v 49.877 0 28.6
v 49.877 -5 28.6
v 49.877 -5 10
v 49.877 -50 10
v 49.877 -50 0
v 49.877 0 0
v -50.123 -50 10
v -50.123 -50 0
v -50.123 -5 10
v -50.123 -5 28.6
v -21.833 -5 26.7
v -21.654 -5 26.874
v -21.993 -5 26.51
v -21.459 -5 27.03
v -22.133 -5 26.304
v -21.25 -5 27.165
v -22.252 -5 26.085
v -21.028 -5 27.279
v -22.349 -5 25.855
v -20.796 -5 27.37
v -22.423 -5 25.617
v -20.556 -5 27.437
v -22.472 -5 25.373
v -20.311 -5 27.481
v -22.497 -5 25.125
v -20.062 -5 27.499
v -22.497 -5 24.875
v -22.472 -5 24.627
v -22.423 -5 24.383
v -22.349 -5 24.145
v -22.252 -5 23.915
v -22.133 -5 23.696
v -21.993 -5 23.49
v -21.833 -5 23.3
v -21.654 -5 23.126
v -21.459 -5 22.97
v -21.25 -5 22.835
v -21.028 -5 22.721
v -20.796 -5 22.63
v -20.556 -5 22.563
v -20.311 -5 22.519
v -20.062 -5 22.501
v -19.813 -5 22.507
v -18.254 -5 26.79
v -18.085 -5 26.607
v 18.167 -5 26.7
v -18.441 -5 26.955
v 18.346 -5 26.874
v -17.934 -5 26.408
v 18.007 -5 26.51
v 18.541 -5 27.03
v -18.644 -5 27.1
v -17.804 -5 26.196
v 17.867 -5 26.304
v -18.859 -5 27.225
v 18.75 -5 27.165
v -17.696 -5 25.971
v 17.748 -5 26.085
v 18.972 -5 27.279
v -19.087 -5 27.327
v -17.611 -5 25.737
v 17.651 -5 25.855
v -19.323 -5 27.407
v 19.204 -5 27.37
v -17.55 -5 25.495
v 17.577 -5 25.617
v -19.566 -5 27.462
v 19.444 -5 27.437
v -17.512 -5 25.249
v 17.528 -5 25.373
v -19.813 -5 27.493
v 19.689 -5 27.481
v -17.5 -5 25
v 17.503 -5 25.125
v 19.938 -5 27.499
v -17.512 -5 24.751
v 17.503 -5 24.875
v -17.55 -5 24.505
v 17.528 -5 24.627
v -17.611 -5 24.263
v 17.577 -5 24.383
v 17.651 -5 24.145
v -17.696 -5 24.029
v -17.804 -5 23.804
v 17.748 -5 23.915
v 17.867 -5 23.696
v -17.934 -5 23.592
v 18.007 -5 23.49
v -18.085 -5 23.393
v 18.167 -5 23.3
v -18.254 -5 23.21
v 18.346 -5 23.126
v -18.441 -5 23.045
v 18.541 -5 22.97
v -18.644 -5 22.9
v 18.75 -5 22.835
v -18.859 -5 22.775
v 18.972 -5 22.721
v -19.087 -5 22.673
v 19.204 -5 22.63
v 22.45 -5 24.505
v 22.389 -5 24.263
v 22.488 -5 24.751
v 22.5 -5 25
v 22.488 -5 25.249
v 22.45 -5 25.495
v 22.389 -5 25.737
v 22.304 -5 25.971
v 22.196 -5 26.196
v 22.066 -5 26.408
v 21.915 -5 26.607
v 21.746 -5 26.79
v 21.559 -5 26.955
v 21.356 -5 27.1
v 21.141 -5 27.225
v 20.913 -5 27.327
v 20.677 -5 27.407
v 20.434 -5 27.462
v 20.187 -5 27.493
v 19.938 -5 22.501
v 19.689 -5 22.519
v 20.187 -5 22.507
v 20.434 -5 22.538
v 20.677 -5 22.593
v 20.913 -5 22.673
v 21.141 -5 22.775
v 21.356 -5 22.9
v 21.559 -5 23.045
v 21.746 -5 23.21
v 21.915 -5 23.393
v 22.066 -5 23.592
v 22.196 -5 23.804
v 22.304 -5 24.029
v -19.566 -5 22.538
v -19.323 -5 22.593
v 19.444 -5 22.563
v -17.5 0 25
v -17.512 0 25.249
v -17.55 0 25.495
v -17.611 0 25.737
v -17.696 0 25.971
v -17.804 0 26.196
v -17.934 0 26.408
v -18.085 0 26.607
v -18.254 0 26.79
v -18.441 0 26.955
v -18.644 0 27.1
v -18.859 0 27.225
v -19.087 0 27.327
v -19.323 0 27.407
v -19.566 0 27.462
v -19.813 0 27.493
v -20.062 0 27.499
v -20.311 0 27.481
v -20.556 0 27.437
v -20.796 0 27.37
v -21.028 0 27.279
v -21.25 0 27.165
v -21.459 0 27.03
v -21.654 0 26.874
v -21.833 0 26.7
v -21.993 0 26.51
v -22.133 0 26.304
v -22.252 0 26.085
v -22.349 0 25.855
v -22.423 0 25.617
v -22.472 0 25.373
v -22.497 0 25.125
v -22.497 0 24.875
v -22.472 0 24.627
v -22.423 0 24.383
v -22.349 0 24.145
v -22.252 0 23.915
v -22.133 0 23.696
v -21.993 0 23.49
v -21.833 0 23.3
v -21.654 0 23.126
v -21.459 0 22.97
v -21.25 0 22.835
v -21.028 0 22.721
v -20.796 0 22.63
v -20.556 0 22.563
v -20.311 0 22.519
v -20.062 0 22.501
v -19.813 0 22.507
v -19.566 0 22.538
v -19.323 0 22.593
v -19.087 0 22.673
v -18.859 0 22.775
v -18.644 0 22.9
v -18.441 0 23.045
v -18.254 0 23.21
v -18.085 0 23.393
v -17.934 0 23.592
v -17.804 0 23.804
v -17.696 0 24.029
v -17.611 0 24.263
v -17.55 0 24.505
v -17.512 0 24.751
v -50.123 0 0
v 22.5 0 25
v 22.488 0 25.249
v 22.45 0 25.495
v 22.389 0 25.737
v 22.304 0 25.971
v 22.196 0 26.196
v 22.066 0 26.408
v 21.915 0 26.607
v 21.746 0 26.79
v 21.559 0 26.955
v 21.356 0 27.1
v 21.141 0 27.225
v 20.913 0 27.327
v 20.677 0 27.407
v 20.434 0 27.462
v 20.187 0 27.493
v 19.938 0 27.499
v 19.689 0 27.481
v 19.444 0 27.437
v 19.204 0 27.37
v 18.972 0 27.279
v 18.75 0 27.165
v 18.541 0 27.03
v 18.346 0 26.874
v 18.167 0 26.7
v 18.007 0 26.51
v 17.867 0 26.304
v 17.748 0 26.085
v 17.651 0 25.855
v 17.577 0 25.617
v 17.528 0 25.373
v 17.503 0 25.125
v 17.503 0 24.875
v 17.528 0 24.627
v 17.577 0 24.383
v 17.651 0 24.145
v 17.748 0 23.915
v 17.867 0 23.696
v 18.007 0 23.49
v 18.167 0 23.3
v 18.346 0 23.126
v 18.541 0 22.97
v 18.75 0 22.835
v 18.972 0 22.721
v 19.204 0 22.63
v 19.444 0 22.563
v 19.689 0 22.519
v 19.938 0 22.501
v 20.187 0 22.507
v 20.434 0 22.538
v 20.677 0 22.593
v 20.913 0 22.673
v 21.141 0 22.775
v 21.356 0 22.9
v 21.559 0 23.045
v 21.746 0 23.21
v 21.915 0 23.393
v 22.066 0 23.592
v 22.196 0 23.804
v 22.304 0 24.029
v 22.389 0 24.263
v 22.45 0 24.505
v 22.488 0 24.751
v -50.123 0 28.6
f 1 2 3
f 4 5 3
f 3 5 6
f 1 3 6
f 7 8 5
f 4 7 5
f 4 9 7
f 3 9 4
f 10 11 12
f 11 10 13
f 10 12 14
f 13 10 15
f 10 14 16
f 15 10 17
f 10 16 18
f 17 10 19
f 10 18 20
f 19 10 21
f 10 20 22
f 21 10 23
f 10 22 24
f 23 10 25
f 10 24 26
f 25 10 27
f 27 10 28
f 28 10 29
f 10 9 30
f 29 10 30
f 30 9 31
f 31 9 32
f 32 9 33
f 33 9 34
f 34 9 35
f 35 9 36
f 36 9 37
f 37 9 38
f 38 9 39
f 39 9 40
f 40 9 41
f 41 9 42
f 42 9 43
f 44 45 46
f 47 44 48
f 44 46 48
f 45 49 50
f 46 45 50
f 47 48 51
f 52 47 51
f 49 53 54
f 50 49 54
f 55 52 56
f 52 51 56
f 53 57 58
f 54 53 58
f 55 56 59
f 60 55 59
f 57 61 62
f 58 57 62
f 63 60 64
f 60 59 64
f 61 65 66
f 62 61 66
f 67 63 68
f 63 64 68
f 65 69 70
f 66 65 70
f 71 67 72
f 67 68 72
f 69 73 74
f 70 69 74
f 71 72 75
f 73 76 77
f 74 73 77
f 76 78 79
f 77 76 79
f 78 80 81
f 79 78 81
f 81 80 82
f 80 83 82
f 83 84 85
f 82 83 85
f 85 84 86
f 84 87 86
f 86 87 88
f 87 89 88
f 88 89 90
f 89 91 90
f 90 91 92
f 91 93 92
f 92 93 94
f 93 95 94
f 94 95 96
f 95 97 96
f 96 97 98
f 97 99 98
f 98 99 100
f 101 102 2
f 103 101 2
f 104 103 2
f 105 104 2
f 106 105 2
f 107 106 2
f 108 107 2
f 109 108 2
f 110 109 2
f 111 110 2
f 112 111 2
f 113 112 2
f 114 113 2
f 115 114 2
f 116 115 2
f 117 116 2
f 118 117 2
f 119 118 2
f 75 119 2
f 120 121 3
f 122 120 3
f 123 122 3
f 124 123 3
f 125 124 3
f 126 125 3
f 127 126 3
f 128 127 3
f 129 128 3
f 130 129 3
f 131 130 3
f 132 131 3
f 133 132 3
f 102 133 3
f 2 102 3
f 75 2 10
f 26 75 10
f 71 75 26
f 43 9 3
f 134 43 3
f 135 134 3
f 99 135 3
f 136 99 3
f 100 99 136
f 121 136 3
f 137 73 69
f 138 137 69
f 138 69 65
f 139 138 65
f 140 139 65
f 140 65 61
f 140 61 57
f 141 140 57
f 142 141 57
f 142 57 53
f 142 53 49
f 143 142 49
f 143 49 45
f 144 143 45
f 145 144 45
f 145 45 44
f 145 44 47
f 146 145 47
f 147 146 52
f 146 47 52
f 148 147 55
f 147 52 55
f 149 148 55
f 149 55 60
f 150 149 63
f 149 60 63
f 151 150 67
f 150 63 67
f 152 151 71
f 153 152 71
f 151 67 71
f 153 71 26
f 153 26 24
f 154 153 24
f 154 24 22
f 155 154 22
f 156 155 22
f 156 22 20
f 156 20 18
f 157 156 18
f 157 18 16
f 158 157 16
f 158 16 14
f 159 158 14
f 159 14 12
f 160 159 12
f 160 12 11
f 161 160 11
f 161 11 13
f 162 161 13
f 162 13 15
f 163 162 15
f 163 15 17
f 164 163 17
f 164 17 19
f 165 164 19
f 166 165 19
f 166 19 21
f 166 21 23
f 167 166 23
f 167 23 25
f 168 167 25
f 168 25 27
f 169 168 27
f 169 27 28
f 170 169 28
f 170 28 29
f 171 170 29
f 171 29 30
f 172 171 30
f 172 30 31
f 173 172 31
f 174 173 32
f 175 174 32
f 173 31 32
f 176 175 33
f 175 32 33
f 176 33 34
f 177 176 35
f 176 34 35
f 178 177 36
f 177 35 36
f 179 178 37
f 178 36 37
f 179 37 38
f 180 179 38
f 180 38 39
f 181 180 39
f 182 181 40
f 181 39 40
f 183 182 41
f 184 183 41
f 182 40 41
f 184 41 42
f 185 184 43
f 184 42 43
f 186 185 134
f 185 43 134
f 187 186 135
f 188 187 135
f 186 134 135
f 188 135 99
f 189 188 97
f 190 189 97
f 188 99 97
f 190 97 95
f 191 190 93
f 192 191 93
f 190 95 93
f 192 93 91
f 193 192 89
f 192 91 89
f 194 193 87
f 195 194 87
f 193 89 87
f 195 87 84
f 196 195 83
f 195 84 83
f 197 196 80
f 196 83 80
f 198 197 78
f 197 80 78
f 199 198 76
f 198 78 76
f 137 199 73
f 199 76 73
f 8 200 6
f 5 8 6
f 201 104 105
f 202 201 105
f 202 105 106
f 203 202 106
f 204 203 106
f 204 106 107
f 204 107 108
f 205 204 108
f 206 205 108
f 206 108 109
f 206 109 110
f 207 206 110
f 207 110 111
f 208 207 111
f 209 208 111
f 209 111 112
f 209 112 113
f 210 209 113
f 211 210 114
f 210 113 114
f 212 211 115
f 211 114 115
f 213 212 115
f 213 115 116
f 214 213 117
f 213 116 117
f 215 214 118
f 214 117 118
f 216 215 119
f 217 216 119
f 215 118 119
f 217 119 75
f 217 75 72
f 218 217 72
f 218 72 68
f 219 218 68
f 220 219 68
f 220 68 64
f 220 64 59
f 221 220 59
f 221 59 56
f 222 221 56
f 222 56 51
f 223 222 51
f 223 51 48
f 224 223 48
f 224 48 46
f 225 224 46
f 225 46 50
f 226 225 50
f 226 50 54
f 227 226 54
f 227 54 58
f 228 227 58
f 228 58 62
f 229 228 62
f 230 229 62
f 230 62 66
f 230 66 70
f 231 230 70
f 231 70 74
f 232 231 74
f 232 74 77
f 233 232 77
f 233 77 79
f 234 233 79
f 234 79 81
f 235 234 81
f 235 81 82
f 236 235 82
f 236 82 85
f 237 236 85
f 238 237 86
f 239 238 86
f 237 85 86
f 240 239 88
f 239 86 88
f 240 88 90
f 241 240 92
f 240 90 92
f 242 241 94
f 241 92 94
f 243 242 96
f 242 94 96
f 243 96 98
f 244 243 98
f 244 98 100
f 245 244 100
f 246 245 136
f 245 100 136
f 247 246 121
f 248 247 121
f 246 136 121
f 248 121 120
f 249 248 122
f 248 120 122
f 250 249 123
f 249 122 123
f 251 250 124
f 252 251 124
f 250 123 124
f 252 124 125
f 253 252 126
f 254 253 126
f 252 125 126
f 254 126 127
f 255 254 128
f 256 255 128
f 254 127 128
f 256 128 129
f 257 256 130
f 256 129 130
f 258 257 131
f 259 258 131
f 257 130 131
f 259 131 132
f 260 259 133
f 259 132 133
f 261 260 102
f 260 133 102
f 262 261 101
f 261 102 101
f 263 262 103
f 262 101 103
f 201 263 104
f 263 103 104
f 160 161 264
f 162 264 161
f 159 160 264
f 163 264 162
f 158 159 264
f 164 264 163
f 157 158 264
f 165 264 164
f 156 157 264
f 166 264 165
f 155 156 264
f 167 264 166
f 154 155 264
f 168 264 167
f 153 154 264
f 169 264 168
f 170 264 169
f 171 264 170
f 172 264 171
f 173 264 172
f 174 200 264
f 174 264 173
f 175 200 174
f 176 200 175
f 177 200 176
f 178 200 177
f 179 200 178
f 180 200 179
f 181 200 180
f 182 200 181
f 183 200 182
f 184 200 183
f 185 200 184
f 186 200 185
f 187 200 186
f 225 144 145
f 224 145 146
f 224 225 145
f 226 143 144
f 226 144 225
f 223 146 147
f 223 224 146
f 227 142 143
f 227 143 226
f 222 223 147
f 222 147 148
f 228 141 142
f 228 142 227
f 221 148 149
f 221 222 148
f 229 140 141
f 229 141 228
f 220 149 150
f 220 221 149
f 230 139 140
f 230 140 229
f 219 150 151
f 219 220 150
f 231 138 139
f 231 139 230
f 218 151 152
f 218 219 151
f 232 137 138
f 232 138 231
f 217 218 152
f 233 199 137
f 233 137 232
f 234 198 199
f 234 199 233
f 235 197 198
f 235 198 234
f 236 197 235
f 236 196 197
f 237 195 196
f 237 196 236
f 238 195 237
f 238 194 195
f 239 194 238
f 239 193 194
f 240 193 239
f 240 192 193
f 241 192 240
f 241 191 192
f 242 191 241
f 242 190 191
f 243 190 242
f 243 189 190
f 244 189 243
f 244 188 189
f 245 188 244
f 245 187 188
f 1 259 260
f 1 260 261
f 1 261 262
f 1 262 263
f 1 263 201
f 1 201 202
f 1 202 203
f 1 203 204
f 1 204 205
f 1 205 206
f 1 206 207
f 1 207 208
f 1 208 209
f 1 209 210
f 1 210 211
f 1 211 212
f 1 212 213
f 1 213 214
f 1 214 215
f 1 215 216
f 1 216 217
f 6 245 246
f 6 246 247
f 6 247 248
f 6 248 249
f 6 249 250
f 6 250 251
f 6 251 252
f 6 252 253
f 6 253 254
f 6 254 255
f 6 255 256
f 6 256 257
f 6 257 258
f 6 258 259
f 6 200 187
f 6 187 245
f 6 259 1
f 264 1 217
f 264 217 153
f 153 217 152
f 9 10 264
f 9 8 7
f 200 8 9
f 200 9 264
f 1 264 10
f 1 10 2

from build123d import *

# Parameters (mm, degrees)
F0_W     = 100
F0_H     = 50
F1_DEPTH = 10
F2_W     = 100
F2_H     = 5
F3_DEPTH = 18.6
F4_R     = 2.5
F5_DEPTH = 5.001


with BuildPart() as f1:
    # F0 (on Top) → F1 (new body)
    with BuildSketch(Plane.XY):
        with Locations((-0.122877, -25)):
            Rectangle(F0_W, F0_H)
    extrude(amount=F1_DEPTH)

    # F2 (on face) → F3 (join)
    with BuildSketch(Plane.XY.offset(10)):
        with Locations((-0.122877, -2.5)):
            Rectangle(F2_W, F2_H)
    extrude(amount=F3_DEPTH)

    # F4 (on face) → F5 (cut, through all)
    with BuildSketch(Plane.XZ.offset(5)):
        with Locations((20, 25)):
            Circle(F4_R)
        with Locations((-20, 25)):
            Circle(F4_R)
    extrude(amount=-F5_DEPTH, mode=Mode.SUBTRACT)


solid = f1.part
